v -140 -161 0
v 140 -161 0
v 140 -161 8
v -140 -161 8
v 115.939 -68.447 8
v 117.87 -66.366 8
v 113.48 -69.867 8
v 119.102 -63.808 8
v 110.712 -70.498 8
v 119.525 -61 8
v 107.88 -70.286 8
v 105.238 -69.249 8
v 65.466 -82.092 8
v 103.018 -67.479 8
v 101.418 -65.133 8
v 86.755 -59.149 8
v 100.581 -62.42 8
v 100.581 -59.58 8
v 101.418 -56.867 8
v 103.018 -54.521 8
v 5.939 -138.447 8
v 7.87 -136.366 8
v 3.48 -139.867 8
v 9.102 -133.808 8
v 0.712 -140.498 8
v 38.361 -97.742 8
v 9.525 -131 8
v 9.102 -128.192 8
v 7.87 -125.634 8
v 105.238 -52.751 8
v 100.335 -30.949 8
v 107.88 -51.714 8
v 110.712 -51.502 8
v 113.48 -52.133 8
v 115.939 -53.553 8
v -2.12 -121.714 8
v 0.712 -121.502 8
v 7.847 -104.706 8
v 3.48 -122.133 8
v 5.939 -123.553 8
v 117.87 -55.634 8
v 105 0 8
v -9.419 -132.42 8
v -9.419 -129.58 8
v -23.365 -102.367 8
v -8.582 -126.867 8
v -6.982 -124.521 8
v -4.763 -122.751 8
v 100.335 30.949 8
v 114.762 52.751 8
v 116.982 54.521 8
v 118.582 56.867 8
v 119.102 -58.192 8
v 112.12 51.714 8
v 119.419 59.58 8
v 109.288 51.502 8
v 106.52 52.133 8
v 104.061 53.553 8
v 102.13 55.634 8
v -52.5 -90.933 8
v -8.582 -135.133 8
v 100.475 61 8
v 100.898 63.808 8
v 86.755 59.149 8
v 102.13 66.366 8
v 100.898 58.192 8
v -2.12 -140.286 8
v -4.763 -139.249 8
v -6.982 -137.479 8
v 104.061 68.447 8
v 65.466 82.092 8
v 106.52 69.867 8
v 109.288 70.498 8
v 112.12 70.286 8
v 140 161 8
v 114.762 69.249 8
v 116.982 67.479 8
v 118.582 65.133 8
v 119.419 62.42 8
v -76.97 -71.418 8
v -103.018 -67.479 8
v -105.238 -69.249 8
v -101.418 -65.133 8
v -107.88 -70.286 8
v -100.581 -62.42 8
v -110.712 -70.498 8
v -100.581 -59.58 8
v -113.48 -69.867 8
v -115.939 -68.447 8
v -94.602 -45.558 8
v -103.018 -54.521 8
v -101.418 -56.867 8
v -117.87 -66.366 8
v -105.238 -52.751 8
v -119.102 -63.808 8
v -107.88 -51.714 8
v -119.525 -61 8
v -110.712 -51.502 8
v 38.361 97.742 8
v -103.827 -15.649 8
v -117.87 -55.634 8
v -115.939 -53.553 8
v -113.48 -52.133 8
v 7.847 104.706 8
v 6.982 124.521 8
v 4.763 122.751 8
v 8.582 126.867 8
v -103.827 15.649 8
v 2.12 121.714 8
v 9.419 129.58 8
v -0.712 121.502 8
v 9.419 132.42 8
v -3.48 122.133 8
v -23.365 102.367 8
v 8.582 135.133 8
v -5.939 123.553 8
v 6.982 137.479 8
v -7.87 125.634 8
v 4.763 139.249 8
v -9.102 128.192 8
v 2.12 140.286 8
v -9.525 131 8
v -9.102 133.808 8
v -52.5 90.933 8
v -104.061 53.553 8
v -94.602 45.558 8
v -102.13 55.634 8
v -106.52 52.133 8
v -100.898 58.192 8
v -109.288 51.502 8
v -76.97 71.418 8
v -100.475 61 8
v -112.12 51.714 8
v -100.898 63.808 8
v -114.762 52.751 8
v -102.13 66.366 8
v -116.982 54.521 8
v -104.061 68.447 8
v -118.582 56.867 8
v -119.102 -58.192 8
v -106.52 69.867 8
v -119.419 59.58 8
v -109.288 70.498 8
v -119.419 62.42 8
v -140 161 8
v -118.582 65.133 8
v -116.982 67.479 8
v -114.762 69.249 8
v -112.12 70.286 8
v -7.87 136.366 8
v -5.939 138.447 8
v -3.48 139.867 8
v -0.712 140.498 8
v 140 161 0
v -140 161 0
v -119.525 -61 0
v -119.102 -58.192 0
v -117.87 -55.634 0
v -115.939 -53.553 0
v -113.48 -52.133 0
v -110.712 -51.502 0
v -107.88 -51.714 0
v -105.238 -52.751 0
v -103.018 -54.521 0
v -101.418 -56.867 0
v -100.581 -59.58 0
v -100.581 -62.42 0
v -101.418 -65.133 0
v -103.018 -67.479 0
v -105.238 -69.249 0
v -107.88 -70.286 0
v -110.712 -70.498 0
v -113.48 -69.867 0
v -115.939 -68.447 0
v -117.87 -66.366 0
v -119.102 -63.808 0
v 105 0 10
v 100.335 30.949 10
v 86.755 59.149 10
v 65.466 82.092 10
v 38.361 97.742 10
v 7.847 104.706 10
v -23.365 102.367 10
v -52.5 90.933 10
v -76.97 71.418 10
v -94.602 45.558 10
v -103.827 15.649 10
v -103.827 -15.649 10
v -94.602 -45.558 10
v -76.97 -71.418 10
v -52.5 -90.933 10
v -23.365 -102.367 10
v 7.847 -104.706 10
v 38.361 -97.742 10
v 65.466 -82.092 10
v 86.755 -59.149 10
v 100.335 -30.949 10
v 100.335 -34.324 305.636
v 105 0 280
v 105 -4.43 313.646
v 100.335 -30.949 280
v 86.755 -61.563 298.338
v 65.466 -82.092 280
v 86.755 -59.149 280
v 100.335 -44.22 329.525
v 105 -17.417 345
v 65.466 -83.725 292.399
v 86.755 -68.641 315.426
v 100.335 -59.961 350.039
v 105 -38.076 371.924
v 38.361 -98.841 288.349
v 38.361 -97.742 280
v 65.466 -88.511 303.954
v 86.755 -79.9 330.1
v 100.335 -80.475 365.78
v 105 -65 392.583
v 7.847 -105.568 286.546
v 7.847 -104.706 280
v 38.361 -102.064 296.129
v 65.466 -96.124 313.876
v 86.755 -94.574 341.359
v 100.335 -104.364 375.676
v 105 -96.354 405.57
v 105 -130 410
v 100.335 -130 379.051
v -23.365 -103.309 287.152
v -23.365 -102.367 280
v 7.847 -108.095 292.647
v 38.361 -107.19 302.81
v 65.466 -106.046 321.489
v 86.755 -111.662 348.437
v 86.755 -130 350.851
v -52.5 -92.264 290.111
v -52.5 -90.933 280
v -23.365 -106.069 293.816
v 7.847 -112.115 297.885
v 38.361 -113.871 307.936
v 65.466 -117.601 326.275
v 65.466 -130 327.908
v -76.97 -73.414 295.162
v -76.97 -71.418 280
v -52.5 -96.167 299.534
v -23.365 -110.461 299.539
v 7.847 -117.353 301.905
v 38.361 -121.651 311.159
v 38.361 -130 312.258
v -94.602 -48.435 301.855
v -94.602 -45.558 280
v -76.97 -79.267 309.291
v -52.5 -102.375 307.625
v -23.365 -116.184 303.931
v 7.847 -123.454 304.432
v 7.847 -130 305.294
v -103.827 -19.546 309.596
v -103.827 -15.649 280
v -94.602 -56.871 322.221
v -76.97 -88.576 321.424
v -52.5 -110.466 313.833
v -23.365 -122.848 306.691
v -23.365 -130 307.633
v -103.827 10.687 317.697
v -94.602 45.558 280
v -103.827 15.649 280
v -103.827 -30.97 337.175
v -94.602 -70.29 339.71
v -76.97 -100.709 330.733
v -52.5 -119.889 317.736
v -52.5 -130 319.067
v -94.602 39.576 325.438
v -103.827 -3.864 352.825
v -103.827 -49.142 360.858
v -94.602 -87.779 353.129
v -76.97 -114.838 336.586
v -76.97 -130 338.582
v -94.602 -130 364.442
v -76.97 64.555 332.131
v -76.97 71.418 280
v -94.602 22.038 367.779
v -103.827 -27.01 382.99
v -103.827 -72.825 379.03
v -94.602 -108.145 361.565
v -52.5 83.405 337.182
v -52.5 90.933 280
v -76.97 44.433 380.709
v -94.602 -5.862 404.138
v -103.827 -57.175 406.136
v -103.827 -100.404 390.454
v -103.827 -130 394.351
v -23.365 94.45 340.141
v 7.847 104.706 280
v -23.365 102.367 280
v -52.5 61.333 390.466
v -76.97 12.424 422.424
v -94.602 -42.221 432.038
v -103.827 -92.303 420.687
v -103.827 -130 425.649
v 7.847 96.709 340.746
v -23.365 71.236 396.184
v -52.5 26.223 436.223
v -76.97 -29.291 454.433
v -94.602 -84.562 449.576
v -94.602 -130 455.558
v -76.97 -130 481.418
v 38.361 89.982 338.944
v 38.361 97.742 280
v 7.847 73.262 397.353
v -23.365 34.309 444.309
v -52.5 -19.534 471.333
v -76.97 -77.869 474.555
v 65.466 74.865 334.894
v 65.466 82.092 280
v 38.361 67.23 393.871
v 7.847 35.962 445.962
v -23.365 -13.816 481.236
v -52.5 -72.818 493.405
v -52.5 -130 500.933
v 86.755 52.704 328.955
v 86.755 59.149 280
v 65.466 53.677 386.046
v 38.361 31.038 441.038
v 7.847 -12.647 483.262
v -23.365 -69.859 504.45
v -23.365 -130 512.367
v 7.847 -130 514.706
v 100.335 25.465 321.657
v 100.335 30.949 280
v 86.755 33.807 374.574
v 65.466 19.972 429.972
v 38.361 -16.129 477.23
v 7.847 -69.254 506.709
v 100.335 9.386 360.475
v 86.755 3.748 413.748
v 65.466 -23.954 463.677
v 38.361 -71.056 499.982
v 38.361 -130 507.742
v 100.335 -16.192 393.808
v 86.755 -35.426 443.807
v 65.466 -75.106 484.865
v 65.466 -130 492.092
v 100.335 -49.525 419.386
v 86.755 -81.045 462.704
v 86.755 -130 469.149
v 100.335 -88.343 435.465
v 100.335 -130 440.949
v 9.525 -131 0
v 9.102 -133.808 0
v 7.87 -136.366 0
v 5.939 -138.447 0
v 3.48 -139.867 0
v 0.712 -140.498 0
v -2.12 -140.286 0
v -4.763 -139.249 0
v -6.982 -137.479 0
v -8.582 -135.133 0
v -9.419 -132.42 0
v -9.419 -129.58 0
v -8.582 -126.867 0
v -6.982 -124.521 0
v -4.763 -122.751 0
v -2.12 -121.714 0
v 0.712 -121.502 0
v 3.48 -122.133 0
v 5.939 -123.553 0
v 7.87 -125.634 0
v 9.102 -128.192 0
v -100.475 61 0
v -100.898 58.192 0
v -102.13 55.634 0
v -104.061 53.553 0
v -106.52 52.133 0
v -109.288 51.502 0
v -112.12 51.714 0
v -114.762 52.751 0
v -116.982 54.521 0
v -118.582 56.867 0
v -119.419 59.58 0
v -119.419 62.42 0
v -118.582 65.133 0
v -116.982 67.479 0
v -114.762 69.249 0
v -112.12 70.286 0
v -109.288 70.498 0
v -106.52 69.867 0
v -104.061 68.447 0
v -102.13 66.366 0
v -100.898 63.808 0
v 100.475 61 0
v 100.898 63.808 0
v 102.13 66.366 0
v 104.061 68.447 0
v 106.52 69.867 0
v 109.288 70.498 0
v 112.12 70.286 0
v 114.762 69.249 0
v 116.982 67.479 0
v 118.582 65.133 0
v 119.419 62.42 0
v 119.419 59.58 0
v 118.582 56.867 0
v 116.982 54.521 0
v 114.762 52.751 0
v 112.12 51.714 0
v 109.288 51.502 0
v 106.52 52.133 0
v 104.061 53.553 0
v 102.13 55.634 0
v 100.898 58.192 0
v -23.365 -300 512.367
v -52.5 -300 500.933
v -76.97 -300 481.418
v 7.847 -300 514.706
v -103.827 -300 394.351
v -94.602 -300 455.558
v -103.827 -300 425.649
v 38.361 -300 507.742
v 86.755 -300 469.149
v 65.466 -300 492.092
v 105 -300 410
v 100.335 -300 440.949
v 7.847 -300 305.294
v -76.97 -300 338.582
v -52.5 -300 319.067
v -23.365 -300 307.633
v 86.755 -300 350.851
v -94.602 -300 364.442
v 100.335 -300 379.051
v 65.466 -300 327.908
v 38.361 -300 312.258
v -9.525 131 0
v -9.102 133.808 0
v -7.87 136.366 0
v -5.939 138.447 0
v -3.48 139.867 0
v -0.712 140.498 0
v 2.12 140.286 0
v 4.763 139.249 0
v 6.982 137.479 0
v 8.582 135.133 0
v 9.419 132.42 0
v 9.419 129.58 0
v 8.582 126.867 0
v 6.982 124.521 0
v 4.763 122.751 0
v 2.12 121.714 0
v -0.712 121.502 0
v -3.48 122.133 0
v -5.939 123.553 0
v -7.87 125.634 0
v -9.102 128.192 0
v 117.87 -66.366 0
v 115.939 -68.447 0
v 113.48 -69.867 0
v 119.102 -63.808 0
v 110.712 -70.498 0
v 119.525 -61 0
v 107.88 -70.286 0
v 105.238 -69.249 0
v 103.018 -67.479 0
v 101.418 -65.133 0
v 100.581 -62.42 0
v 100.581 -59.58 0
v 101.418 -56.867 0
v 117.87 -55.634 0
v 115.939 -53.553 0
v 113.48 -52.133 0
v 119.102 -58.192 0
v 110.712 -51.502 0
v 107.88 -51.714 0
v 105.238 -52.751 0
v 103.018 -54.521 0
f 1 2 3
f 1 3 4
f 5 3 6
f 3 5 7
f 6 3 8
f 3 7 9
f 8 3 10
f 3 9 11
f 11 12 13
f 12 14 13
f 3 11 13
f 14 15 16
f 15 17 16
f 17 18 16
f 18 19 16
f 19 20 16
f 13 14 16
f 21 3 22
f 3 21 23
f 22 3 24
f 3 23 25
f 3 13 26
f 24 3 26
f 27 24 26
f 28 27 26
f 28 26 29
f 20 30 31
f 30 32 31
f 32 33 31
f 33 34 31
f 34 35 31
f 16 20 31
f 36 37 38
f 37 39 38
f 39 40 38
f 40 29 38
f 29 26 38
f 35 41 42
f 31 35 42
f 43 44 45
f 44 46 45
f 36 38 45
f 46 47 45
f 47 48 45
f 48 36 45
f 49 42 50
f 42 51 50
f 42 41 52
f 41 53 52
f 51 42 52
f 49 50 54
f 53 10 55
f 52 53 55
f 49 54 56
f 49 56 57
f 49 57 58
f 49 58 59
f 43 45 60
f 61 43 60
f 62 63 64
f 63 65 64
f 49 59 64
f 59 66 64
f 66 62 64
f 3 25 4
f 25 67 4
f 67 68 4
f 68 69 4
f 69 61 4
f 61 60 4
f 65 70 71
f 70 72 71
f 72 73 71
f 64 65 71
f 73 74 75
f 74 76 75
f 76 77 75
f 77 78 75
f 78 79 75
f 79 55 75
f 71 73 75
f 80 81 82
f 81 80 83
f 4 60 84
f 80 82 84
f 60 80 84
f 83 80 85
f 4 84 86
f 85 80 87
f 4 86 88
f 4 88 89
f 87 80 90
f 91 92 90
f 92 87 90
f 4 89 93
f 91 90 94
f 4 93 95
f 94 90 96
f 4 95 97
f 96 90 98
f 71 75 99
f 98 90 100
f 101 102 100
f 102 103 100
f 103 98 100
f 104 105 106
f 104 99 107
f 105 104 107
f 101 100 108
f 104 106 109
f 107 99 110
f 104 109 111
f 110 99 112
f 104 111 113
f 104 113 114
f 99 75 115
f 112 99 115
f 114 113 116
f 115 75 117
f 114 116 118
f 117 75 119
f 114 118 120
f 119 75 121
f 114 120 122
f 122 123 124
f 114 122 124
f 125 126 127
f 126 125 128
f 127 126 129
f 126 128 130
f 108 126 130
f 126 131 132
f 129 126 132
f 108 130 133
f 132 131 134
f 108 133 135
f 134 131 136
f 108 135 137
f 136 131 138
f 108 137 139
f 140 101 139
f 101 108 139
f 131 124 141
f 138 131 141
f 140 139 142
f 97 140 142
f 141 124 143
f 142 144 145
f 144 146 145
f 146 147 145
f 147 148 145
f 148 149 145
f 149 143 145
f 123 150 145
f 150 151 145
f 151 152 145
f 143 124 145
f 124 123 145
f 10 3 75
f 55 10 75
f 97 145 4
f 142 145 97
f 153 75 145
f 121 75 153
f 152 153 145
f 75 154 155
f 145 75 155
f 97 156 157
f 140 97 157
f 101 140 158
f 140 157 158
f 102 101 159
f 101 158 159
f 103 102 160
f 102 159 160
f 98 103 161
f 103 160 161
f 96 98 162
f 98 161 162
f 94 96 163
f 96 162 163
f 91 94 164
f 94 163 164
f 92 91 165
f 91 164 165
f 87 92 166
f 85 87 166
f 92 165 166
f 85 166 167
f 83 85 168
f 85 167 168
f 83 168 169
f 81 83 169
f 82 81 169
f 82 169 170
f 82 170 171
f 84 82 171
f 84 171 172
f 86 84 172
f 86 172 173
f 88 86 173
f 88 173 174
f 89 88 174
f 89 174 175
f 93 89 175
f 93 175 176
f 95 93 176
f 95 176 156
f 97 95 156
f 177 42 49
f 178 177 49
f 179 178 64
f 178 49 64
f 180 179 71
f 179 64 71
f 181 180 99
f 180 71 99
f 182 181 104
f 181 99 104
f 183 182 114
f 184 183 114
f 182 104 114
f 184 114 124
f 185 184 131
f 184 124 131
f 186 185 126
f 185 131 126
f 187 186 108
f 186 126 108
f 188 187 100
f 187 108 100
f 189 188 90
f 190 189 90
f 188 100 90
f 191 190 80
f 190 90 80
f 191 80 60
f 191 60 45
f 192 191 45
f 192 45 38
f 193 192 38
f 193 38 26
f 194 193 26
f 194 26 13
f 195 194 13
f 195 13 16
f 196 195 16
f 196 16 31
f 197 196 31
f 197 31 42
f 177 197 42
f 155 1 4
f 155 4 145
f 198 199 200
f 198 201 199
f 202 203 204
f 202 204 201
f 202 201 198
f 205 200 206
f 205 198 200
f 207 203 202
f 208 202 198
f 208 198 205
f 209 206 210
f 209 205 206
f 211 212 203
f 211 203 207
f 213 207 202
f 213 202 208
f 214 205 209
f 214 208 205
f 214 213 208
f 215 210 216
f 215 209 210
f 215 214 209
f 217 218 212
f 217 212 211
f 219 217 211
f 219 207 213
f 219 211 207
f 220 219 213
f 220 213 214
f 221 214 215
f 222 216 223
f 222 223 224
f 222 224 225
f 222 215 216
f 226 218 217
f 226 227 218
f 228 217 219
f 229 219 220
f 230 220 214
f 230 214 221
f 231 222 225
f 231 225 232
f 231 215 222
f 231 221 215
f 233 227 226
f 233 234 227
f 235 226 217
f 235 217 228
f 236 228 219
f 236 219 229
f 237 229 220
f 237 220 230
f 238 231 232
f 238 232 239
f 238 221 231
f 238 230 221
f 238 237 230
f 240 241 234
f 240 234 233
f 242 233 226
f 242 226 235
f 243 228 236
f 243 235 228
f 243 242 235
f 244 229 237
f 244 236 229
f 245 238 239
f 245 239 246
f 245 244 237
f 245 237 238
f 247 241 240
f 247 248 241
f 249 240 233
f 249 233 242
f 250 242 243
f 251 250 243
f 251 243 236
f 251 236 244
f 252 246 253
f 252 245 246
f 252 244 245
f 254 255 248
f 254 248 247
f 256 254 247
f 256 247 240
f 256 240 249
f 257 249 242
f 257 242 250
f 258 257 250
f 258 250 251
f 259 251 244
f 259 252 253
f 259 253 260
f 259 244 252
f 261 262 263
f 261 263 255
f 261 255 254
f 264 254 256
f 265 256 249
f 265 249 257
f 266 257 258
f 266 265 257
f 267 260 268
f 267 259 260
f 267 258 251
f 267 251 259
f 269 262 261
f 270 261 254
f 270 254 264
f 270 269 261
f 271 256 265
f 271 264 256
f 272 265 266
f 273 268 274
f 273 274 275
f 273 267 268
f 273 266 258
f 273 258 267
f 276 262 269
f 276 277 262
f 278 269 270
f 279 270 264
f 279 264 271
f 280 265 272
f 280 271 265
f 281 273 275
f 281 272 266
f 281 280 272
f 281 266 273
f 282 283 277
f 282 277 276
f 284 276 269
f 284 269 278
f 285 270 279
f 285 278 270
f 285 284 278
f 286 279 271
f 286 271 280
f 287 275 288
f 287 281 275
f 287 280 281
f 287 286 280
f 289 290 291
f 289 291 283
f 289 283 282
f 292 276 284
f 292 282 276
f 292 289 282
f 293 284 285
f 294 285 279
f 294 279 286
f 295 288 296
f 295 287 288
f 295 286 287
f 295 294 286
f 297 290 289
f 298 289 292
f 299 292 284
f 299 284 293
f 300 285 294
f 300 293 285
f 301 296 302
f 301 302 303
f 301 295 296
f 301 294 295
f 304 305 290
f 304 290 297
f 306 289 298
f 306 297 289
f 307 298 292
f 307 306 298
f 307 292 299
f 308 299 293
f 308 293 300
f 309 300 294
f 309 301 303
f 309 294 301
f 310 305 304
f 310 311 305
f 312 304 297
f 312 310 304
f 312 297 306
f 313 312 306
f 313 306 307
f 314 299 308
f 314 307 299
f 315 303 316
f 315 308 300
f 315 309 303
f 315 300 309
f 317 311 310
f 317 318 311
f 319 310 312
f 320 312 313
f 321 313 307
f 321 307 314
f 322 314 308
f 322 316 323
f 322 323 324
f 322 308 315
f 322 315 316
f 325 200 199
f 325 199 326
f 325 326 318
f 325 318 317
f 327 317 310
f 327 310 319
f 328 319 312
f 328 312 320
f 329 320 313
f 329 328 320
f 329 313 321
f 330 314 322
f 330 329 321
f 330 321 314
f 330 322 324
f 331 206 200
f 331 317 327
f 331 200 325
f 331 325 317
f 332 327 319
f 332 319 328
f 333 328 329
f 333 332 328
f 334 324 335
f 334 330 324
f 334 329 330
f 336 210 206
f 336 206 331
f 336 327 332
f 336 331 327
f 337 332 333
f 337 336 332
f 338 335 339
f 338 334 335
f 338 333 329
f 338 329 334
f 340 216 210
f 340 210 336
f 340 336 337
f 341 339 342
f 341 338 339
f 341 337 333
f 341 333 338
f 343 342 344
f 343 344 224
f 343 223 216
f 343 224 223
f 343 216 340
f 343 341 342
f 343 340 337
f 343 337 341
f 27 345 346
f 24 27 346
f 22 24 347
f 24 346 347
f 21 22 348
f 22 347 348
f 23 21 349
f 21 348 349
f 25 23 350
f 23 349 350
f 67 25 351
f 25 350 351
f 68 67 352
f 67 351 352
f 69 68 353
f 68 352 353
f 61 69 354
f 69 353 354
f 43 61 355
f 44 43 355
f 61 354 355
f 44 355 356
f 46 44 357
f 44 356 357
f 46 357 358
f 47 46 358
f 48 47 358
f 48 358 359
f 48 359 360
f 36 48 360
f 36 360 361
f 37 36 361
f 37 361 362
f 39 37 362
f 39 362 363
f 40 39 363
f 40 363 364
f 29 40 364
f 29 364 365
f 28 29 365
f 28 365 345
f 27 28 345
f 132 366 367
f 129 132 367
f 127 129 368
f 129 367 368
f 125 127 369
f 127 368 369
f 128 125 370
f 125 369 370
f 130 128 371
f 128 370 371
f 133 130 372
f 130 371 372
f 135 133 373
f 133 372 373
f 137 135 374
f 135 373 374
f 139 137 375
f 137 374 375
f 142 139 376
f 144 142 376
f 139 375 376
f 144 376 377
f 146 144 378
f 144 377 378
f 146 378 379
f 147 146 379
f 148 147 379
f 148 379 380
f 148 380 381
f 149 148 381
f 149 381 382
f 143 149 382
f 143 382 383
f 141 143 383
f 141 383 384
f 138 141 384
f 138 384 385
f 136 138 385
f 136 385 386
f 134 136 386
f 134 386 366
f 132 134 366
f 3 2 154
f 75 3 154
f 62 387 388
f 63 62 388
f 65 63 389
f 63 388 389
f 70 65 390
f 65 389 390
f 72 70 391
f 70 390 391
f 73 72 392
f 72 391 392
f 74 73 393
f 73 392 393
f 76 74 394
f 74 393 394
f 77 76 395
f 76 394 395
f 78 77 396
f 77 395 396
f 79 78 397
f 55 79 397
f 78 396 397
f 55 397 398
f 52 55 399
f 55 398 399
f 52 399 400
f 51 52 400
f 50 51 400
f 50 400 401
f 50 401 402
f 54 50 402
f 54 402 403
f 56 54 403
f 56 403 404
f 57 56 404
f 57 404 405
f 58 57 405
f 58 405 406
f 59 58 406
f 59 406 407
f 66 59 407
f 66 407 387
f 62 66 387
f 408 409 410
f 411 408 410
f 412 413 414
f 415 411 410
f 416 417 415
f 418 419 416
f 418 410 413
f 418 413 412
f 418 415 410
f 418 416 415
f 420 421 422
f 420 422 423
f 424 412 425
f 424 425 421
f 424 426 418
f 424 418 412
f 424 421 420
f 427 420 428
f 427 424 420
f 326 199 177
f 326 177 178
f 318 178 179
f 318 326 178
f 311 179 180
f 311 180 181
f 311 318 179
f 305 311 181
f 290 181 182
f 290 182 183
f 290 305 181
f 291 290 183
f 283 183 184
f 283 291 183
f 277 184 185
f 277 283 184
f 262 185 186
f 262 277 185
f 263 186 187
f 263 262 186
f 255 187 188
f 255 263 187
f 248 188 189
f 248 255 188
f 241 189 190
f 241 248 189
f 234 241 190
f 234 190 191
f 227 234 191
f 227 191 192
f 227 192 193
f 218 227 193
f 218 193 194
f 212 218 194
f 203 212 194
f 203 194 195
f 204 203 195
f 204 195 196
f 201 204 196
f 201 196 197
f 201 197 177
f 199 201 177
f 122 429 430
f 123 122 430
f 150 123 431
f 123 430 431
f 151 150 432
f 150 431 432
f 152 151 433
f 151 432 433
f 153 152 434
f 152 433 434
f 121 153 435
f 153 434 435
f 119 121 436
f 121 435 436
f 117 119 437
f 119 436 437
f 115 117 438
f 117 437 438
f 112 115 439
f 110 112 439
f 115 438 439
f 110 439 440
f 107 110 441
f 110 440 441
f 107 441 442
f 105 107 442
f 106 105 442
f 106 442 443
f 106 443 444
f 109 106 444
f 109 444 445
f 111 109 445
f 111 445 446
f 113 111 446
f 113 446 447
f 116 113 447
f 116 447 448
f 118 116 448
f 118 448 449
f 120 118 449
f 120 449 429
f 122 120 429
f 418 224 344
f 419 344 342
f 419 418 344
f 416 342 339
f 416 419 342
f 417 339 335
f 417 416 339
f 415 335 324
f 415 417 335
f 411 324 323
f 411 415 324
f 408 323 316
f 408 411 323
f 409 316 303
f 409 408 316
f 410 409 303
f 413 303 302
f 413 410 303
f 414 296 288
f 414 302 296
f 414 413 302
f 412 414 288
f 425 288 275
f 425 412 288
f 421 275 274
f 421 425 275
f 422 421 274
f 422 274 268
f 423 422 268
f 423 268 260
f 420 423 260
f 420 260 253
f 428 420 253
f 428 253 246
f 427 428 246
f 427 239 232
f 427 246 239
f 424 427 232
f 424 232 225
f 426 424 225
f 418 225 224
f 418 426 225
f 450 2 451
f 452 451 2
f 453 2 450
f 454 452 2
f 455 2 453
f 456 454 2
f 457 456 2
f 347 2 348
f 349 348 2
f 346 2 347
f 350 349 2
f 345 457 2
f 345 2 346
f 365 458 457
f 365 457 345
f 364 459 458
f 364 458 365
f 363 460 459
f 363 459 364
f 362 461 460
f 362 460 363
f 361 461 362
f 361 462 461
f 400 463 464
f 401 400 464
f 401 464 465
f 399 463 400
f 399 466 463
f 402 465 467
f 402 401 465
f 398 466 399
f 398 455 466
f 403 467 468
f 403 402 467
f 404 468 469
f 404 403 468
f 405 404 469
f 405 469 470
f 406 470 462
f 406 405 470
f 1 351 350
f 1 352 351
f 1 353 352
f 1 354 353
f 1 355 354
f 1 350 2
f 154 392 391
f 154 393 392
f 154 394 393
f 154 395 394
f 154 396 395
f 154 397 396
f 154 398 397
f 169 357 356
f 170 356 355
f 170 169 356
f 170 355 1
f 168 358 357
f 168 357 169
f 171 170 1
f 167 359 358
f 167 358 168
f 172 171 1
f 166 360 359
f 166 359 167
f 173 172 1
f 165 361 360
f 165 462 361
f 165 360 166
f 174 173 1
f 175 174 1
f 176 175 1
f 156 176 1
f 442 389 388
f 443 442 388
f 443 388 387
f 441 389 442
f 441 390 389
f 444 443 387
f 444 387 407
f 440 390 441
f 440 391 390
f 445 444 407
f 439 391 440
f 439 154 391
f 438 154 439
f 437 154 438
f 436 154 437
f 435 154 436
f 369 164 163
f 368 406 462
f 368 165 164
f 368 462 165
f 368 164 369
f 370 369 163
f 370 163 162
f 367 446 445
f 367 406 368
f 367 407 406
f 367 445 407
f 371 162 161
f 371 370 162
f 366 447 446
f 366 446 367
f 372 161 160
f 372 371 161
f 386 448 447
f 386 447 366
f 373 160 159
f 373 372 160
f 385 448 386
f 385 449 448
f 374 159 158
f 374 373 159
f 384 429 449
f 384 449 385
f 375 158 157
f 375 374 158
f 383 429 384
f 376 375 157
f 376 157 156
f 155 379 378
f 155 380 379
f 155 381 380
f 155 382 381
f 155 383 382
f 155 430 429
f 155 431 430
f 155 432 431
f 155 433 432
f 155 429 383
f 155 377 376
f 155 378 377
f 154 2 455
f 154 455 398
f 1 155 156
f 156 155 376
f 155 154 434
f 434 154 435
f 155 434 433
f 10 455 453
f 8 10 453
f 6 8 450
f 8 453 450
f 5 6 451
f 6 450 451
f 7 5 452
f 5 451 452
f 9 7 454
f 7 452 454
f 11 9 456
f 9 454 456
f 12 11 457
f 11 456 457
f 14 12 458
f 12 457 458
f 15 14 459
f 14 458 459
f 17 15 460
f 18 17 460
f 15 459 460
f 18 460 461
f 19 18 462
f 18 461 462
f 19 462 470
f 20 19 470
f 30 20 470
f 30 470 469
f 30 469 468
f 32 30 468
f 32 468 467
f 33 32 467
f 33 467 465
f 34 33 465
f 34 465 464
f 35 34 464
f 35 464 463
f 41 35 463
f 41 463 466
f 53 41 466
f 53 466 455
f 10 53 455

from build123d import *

# Parameters (mm, degrees)
CROQUIS1_R              = 105
SALIENTE_EXTRUIR1_DEPTH = 10
CROQUIS2_R              = 105
CROQUIS3_W              = 280
CROQUIS3_H              = 322
SALIENTE_EXTRUIR2_DEPTH = 8
CROQUIS6_R              = 9.525
CORTAR_EXTRUIR1_DEPTH   = 10


with BuildPart() as part:
    # Croquis1 → Saliente-Extruir1 (new body)
    with BuildSketch(Plane.XY):
        Circle(CROQUIS1_R)
    extrude(amount=SALIENTE_EXTRUIR1_DEPTH)

    # Barrer1: sweep along a curve in space
    with BuildLine() as barrer1_path:
        Line((0, 0, 10), (0, 0, 280))
        ThreePointArc((0, 0, 280), (0, -38.076118446, 371.923881554), (0, -130, 410))
        Line((0, -130, 410), (0, -300, 410))
    # Croquis2 → Barrer1 (sweep)
    with BuildSketch(Plane.XY.offset(10)):
        Circle(CROQUIS2_R)
    sweep(path=barrer1_path.line)

    # Croquis3 → Saliente-Extruir2 (add)
    with BuildSketch(Plane(origin=(0, 0, 0), x_dir=(-1, 0, 0), z_dir=(0, 0, -1))):
        Rectangle(CROQUIS3_W, CROQUIS3_H)
    extrude(amount=-SALIENTE_EXTRUIR2_DEPTH)

    # Croquis6 → Cortar-Extruir1 (cut)
    with BuildSketch(Plane(origin=(0, 0, 0), x_dir=(-1, 0, 0), z_dir=(0, 0, -1))):
        with Locations((0, 131)):
            Circle(CROQUIS6_R)
        with Locations((-110, 61)):
            Circle(CROQUIS6_R)
        with Locations(Location((110, 61, 0), (0, 0, 180))):
            Circle(CROQUIS6_R)
        with Locations((110, -61)):
            Circle(CROQUIS6_R)
        with Locations(Location((-110, -61, 0), (0, 0, 180))):
            Circle(CROQUIS6_R)
        with Locations(Location((0, -131, 0), (0, 0, 180))):
            Circle(CROQUIS6_R)
    extrude(amount=-CORTAR_EXTRUIR1_DEPTH, mode=Mode.SUBTRACT)


solid = part.part
